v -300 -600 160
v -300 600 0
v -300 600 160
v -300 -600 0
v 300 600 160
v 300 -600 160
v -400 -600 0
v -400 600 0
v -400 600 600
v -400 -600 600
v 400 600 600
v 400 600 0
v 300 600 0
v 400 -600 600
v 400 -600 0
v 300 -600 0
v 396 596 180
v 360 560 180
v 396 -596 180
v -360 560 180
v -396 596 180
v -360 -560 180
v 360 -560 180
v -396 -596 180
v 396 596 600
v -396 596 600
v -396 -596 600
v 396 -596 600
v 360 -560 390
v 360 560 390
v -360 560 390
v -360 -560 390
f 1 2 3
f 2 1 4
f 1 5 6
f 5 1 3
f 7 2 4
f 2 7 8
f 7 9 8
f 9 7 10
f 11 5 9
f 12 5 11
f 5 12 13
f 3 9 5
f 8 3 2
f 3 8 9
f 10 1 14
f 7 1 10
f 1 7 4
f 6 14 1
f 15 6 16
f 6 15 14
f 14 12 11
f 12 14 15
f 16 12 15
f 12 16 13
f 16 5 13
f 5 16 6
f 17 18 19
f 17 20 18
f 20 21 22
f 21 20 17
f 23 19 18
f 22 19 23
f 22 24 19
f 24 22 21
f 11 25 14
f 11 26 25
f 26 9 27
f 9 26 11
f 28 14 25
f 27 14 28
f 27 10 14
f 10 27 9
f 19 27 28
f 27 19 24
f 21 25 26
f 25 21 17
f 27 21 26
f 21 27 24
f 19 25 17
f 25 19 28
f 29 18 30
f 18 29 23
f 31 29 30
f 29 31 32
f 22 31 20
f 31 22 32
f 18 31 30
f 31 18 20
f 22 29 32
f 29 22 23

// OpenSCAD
// crate_runners - generated by conv_3d.py from out/mech/module_specs.json (F4.2) - units mm
// DESIGN - check and release before manufacture. Local axes: x travel, y across, z up, conveyor top z = 700.

cL = 1200;
cW = 800;
cH = 600;
run_w = 100;
run_h = 160;

module crate_runners() {
  translate([-400.00, -600.00, 0.00]) cube([100.00, 1200.00, 160.00]);
  translate([300.00, -600.00, 0.00]) cube([100.00, 1200.00, 160.00]);
  translate([-400.00, -600.00, 160.00]) cube([800.00, 1200.00, 20.00]);
  translate([-400.00, -600.00, 160.00]) cube([800.00, 4.00, 440.00]);
  translate([-400.00, 596.00, 160.00]) cube([800.00, 4.00, 440.00]);
  translate([-400.00, -596.00, 160.00]) cube([4.00, 1192.00, 440.00]);
  translate([396.00, -596.00, 160.00]) cube([4.00, 1192.00, 440.00]);
  translate([-360.00, -560.00, 180.00]) cube([720.00, 1120.00, 210.00]);
}
crate_runners();
